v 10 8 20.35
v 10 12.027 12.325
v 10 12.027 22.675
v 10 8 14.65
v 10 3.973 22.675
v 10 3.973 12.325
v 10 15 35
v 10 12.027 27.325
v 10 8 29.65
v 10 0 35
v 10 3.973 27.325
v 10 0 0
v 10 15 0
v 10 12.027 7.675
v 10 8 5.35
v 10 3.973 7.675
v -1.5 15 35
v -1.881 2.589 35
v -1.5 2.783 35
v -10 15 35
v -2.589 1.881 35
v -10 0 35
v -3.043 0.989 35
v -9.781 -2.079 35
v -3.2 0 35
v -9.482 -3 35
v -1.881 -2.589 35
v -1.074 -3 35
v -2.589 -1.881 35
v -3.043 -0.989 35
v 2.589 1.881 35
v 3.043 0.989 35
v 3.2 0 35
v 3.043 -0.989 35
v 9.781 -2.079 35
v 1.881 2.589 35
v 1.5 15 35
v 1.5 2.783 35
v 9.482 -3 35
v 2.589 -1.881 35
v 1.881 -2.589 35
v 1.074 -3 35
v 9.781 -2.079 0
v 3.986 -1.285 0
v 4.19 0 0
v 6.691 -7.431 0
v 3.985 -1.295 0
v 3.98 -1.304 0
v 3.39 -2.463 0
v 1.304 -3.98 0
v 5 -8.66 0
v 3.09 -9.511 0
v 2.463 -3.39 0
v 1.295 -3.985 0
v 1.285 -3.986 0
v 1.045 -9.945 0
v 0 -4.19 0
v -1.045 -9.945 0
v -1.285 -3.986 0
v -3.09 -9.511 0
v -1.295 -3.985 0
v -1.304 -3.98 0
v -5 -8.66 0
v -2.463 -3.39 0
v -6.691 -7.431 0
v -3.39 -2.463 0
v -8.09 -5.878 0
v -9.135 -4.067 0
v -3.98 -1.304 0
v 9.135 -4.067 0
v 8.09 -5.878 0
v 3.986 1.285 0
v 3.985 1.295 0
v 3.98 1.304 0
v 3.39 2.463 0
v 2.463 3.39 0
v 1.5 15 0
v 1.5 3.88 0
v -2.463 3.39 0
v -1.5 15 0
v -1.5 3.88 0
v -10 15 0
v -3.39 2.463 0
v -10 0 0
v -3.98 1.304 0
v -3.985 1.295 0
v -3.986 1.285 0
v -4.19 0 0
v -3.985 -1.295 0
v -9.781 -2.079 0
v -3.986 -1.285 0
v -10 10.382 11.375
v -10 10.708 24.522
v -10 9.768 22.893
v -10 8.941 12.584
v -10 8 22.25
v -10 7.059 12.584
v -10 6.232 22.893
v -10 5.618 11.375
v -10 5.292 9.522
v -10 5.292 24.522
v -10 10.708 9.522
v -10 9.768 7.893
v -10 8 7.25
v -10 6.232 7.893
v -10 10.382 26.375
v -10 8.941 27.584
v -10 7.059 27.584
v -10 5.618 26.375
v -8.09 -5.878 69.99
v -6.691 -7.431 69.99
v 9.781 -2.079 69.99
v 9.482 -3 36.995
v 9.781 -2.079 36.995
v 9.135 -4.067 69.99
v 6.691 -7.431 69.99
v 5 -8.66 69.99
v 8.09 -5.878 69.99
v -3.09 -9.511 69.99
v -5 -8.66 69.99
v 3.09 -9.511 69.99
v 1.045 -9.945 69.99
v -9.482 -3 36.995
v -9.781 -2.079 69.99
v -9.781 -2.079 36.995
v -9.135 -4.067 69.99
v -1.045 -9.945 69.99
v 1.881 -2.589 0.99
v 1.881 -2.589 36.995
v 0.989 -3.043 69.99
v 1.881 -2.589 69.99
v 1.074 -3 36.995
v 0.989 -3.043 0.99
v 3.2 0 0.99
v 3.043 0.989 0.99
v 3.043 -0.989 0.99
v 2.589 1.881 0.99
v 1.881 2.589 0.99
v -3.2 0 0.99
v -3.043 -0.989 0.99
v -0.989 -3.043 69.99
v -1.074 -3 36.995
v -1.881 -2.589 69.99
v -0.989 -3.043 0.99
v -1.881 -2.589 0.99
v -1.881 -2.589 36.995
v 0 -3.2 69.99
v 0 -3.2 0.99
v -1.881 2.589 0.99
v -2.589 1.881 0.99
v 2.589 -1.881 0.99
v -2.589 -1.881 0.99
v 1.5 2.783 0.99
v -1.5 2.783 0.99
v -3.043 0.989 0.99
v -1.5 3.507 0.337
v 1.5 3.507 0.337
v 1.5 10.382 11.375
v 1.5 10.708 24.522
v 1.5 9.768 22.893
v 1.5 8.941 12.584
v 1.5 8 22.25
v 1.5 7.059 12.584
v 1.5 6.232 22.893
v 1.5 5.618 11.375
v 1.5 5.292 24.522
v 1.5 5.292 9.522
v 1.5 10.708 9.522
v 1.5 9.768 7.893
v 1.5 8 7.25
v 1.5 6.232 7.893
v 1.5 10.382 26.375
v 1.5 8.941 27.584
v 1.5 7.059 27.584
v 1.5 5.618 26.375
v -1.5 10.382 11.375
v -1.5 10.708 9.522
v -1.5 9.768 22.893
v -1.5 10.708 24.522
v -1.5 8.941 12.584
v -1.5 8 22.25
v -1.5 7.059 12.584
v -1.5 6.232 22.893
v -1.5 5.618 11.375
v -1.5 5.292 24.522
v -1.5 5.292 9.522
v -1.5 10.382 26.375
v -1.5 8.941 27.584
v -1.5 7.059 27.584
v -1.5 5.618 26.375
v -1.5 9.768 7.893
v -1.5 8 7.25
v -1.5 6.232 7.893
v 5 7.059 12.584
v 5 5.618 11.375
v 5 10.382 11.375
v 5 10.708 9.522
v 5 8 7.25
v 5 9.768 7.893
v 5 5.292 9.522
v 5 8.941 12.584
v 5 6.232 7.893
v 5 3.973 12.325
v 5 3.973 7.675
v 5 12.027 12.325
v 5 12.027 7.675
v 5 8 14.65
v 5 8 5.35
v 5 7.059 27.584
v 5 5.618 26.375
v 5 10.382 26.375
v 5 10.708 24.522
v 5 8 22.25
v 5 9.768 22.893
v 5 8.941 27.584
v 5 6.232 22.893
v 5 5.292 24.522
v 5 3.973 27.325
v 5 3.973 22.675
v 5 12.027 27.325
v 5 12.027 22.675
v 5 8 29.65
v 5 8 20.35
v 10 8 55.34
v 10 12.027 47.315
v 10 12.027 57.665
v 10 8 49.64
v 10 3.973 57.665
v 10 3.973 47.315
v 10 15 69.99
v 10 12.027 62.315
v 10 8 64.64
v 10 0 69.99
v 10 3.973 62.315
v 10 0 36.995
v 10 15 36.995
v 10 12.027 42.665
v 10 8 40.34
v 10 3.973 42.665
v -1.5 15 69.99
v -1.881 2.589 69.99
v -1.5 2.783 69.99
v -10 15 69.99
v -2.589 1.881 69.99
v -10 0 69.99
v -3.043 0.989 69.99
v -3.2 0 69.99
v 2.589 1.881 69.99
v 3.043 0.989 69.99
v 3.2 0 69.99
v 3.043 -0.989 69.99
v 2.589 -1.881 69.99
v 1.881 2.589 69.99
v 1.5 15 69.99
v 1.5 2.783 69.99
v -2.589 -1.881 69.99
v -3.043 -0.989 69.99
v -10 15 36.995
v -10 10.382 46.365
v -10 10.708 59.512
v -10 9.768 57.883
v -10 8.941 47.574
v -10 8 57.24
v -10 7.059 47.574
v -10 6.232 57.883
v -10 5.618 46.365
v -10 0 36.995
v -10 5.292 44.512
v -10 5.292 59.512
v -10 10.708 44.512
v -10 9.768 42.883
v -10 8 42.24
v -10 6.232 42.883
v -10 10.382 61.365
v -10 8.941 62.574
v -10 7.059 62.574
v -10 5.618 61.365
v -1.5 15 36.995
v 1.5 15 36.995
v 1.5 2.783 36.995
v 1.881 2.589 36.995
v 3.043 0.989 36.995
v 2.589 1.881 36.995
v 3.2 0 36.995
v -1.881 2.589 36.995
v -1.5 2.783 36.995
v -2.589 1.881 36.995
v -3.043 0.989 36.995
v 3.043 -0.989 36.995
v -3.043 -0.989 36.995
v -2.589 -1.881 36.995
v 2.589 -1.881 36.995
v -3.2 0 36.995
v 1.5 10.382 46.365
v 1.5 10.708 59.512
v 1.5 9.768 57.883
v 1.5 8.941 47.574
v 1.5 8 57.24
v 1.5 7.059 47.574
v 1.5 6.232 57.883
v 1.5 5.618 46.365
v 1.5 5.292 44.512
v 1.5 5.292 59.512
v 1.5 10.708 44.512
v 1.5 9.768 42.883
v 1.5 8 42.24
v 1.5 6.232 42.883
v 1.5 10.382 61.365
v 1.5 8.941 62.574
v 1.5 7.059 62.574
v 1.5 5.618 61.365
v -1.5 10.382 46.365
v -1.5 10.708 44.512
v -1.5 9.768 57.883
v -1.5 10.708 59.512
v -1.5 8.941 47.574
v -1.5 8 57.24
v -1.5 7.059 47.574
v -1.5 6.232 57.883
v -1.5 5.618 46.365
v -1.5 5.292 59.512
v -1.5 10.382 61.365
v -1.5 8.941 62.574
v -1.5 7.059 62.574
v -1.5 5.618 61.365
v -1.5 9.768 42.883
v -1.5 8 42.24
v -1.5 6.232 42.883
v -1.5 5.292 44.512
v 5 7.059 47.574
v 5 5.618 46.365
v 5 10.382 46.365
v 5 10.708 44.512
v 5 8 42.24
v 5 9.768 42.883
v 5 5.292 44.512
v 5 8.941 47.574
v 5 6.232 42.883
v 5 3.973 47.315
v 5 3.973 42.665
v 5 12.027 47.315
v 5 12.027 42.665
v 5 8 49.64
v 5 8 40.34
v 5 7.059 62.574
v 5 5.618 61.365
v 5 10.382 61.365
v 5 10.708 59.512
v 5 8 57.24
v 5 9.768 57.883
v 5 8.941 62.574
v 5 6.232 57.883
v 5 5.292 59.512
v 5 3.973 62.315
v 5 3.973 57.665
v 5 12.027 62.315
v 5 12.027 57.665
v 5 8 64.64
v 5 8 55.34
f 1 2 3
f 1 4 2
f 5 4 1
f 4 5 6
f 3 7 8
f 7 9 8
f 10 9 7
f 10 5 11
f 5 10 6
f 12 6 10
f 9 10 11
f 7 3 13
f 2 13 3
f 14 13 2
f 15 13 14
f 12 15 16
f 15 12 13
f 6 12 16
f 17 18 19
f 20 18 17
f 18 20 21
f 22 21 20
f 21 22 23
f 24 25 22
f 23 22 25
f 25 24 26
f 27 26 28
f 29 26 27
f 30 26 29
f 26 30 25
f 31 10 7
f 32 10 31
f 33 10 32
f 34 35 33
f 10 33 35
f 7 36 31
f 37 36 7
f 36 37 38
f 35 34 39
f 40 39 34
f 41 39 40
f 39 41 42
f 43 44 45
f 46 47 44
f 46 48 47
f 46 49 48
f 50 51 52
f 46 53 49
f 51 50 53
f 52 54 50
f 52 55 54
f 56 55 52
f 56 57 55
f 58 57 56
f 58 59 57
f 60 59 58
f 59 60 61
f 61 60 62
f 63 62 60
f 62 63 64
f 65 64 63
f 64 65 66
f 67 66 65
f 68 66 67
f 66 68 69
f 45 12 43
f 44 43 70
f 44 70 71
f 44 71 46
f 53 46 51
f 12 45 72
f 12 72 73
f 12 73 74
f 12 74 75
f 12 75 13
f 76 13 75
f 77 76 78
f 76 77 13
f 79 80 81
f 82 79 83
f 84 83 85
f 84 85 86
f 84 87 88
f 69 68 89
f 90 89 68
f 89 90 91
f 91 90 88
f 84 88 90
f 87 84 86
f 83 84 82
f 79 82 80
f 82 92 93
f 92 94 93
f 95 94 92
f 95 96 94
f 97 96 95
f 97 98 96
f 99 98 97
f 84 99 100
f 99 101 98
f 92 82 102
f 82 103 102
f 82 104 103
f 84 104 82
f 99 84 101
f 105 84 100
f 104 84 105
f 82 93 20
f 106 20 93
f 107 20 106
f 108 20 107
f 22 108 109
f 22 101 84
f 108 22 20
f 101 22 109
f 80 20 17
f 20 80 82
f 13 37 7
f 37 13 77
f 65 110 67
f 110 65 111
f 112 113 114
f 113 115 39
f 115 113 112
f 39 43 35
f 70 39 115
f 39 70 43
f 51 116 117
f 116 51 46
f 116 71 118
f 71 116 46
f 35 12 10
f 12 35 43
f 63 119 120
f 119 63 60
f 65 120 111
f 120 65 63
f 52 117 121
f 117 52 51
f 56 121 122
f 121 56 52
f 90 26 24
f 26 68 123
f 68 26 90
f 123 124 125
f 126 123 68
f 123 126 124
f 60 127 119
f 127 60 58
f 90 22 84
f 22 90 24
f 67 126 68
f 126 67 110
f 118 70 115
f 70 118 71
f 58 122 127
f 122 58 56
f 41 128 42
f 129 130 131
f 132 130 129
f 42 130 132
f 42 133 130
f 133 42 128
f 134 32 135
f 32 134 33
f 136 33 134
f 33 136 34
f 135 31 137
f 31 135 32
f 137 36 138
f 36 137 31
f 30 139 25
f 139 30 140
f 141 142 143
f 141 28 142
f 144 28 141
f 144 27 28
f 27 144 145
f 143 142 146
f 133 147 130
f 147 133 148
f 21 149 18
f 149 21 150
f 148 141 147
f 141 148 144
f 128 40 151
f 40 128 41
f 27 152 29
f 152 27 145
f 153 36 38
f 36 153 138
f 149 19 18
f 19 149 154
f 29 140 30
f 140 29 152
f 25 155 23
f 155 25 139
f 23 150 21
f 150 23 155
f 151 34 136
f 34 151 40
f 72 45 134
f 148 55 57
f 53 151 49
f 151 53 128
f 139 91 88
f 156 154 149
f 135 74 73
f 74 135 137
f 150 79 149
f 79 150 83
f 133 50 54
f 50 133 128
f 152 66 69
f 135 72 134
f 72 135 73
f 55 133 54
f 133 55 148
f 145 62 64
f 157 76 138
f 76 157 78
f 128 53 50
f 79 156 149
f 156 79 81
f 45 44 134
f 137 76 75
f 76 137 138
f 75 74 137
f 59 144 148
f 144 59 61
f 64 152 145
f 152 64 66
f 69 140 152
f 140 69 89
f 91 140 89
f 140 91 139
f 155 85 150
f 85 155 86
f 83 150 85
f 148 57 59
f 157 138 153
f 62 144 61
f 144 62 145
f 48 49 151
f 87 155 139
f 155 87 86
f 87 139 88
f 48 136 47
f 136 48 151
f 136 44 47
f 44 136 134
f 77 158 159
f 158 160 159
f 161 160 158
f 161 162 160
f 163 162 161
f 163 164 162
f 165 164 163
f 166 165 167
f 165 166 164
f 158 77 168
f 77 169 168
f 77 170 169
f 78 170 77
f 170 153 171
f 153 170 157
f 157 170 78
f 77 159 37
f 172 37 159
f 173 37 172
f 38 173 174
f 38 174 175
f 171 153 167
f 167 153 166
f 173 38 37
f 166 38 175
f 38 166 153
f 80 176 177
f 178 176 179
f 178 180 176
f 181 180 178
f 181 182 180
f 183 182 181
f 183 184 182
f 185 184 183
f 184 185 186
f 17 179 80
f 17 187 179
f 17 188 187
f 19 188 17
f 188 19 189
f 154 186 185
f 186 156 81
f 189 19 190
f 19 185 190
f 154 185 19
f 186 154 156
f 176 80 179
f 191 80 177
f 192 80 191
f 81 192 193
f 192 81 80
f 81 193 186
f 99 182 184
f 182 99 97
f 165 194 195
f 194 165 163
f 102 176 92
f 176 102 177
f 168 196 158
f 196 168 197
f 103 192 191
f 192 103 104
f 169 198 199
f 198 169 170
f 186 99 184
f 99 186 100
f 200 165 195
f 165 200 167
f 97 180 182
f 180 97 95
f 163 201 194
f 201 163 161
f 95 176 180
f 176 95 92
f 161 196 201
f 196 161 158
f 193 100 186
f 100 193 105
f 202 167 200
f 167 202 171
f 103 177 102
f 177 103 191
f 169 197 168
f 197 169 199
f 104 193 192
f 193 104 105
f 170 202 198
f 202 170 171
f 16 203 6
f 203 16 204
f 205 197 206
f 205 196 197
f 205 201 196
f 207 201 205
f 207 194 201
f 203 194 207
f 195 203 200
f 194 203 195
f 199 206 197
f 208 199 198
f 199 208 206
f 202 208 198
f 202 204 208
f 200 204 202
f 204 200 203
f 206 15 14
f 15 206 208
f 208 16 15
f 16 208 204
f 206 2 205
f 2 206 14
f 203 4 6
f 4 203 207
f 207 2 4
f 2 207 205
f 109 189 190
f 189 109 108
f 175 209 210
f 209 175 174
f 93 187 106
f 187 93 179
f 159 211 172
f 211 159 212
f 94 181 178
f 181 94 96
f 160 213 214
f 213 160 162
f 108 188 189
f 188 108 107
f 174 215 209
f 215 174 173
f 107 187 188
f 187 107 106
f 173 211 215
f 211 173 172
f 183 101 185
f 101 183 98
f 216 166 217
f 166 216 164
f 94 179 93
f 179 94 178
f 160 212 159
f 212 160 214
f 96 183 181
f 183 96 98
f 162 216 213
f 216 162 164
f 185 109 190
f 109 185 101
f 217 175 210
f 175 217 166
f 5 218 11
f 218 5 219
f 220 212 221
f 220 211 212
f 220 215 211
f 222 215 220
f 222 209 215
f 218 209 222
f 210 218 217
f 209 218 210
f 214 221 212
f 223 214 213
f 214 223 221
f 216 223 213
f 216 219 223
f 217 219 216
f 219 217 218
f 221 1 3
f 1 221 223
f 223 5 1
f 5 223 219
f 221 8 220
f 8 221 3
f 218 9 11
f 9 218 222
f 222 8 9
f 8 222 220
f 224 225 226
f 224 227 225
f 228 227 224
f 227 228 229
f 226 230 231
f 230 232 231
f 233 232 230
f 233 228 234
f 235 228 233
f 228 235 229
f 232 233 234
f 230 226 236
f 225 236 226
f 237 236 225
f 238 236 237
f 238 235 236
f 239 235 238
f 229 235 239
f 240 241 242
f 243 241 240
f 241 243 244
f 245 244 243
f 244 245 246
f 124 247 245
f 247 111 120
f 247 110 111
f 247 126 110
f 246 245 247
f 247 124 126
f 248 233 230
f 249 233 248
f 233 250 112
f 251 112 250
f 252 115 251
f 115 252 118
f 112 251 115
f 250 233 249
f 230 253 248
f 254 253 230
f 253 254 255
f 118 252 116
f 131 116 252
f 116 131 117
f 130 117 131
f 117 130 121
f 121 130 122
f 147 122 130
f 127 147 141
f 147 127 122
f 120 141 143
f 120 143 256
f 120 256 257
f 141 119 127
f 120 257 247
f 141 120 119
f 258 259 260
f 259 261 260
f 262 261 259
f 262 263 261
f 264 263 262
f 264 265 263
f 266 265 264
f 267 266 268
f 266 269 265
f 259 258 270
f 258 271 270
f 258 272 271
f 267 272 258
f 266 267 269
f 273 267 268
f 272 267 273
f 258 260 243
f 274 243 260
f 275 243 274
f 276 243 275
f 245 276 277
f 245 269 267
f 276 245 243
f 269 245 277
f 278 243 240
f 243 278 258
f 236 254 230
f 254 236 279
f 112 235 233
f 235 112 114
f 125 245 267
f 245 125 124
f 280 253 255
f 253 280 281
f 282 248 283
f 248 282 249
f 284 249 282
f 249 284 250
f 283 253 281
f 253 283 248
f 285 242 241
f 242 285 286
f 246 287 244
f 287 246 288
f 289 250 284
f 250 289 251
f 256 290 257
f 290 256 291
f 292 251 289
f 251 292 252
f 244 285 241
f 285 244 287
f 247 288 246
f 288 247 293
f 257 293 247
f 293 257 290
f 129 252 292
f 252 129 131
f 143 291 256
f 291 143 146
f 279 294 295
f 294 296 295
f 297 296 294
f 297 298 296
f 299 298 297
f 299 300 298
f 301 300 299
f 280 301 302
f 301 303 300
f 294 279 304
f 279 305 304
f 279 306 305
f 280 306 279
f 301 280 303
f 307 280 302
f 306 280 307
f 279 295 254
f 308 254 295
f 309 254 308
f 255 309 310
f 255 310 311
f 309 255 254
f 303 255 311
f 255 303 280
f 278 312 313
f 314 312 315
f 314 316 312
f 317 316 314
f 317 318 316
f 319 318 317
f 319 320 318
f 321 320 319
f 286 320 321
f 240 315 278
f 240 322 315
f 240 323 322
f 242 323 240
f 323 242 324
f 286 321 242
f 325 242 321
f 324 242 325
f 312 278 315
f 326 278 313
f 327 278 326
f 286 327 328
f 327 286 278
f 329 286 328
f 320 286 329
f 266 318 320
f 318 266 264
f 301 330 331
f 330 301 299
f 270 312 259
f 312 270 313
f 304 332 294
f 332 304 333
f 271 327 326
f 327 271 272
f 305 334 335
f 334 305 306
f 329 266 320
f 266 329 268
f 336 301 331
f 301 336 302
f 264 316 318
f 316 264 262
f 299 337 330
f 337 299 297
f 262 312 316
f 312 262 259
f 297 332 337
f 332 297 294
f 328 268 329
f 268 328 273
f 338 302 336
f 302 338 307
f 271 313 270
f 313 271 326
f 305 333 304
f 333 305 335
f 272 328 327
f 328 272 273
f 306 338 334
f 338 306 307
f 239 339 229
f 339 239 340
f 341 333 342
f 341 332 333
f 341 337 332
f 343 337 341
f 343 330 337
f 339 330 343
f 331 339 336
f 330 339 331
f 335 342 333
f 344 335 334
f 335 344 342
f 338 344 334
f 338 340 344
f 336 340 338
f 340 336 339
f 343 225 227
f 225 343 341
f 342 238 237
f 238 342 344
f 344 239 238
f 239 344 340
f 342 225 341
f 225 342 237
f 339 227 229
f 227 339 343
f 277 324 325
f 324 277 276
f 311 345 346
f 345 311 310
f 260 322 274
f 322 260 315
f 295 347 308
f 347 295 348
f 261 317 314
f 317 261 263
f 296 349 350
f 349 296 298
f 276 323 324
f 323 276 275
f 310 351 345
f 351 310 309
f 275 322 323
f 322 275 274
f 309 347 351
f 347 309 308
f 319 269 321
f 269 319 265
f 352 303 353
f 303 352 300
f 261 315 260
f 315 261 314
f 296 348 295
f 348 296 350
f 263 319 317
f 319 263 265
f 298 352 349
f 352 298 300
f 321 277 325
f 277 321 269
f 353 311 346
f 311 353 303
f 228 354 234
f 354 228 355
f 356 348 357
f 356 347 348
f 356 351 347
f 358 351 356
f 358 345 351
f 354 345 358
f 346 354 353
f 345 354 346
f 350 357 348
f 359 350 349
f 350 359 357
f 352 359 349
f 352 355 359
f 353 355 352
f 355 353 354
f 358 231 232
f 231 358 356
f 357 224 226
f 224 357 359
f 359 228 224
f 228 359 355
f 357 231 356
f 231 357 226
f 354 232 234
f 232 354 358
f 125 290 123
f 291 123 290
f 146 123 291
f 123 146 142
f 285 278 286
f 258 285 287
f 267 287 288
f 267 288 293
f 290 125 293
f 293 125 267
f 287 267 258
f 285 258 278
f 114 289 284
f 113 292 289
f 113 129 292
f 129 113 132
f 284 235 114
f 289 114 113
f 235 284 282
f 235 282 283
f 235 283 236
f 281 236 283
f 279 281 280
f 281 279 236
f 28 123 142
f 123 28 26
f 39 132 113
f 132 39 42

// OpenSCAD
rod_r=6/2+.2; //.4 too big, 0 too small
m4_r=4.5/2-.2;
difference()
{
    union()
    {
        translate([0,15/2,35/2])cube([20,15,35],center=true);
        cylinder(r=20/2,h=35);
    }
    translate([0,0,-1])cylinder(r=rod_r,h=40,$fn=20);
    translate([0,0,-0.01])cylinder(r2=rod_r,r1=rod_r+1,h=1,$fn=20);
    //cutout
    translate([0,10,19])cube([3,20,40],center=true);
    //screw close
    translate([0,8,10])rotate([0,90,0])cylinder(r=5.5/2,h=40,center=true);
    translate([15,8,10])rotate([0,90,0])cylinder(r=9.3/2,h=20,center=true,$fn=6);
    translate([0,8,25])rotate([0,90,0])cylinder(r=5.5/2,h=40,center=true);
    translate([15,8,25])rotate([0,90,0])cylinder(r=9.3/2,h=20,center=true,$fn=6);
}

translate([0,0,35-0.01])difference()
{
    union()
    {
        translate([0,15/2,35/2])cube([20,15,35],center=true);
        cylinder(r=20/2,h=35);
    }
    translate([0,0,-1])cylinder(r=rod_r,h=40,$fn=20);

    //cutout
    translate([0,10,19])cube([3,20,40],center=true);
    //screw close
    translate([0,8,10])rotate([0,90,0])cylinder(r=5.5/2,h=40,center=true);
    translate([15,8,10])rotate([0,90,0])cylinder(r=9.3/2,h=20,center=true,$fn=6);
    translate([0,8,25])rotate([0,90,0])cylinder(r=5.5/2,h=40,center=true);
    translate([15,8,25])rotate([0,90,0])cylinder(r=9.3/2,h=20,center=true,$fn=6);
    translate([0,10,1])cube([21,26,2.01],center=true);
}
